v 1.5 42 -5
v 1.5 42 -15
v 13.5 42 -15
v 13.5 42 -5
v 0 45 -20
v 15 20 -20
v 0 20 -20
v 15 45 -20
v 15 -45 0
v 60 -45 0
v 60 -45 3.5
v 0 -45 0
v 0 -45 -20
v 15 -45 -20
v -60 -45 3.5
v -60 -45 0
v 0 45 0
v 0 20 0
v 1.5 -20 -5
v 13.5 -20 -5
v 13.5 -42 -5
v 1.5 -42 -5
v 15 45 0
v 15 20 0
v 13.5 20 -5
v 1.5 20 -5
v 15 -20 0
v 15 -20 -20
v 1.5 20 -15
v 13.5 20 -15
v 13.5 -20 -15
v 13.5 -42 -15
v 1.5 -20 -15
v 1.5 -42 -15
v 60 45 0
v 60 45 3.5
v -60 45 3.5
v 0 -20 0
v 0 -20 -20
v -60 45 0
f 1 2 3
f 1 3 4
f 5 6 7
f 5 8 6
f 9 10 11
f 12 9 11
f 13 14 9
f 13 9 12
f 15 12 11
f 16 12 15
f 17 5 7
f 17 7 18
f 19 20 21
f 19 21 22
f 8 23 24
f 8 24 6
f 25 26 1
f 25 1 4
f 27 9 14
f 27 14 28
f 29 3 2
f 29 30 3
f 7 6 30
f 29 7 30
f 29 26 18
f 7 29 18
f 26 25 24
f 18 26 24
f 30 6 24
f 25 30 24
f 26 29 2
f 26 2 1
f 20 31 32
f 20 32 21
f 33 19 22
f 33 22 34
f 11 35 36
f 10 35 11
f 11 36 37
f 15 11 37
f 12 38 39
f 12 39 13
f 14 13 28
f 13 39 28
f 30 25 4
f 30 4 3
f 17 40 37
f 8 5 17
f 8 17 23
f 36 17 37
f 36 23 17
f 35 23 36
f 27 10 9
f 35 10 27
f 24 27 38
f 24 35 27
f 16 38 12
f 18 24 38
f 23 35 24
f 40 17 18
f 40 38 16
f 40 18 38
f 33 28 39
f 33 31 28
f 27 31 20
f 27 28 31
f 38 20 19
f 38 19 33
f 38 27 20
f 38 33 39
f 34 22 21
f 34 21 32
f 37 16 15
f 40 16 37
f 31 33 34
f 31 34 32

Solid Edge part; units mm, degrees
sketch "Sketch1" plane through (0, 0, 0) normal (0, 0, 1) x (1, 0, 0)
  line L0 (0, 45) -> (60, 45)
  line L1 (60, 45) -> (60, -45)
  line L2 (60, -45) -> (-60, -45)
  line L3 (-60, -45) -> (-60, 45)
  line L4 (-60, 45) -> (0, 45)
extrude "Protrusion1" add sketch "Sketch1" along normal blind 3.5
sketch "Sketch2" plane through (0, 45, 1.75) normal (0, 1, 0) x (-1, 0, 0)
  line L0 (-15, -1.75) -> (-15, -21.75)
  line L1 (-15, -21.75) -> (0, -21.75)
  line L2 (0, -21.75) -> (0, -1.75)
  line L3 (0, -1.75) -> (-15, -1.75)
extrude "ExtrudedProtrusion_3" add sketch "Sketch2" against normal blind 25
sketch "Sketch3" plane through (7.5, 20, -10) normal (0, -1, 0) x (-1, 0, 0)
  line L0 (-6, 5) -> (6, 5)
  line L1 (6, 5) -> (6, -5)
  line L2 (6, -5) -> (-6, -5)
  line L3 (-6, -5) -> (-6, 5)
extrude "ExtrudedCutout_3" cut sketch "Sketch3" against normal blind 22
sketch "Sketch4" plane through (0, 0, 0) normal (0, 0, -1) x (-1, 0, 0)
  line L0 (0, -45) -> (-15, -45)
  line L1 (-15, -45) -> (-15, -20)
  line L2 (-15, -20) -> (0, -20)
  line L3 (0, -20) -> (0, -45)
extrude "ExtrudedProtrusion_5" add sketch "Sketch4" along normal blind 20
sketch "Sketch5" plane through (7.5, -20, -10) normal (0, 1, 0) x (-1, 0, 0)
  line L0 (-6, 5) -> (6, 5)
  line L1 (6, 5) -> (6, -5)
  line L2 (6, -5) -> (-6, -5)
  line L3 (-6, -5) -> (-6, 5)
extrude "ExtrudedCutout_4" cut sketch "Sketch5" against normal blind 22
